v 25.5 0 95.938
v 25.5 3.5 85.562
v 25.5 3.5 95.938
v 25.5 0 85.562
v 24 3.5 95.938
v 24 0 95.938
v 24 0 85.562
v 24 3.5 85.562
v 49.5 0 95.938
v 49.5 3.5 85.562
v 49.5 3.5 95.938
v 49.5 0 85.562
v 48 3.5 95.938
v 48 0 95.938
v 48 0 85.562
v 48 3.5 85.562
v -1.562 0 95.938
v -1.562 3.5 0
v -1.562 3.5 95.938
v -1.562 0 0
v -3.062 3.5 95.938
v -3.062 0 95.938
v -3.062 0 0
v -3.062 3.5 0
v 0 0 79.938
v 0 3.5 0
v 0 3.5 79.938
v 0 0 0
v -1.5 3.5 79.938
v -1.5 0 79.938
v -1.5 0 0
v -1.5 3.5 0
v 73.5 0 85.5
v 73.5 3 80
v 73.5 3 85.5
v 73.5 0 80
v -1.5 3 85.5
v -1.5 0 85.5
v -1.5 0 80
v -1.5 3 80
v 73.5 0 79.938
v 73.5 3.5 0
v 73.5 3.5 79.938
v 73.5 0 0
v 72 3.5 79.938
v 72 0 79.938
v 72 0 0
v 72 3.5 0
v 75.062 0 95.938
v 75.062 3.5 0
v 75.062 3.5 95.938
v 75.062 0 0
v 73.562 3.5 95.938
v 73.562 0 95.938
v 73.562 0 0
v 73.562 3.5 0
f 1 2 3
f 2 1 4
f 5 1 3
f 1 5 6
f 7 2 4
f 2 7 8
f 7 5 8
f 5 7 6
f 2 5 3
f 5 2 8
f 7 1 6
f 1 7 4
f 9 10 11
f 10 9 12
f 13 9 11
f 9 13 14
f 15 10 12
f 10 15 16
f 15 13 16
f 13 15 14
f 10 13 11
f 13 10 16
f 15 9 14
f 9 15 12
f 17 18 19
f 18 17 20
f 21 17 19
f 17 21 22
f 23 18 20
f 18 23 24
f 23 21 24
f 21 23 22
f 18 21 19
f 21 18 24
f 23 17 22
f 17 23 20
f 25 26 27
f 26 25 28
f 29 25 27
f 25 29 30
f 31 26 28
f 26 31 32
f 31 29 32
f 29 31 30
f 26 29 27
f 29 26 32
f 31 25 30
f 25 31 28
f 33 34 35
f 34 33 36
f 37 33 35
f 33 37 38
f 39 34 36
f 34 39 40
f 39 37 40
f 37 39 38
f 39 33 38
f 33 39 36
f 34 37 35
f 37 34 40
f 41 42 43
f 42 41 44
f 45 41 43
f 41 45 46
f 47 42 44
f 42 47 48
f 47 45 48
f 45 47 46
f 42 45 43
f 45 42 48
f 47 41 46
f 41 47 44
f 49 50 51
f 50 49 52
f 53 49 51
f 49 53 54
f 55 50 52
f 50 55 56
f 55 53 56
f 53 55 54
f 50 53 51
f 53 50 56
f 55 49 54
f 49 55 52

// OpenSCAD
// Door opening dimension (W x H x D)
Door_Dimensions = [72, 80, 3.5];

// Dimensions of the studs material to use (W x H x L)
Stud_Dimensions = [1.5, 3.5, 96];

// Dimensions of the header material.
Header_Dimensions = [1.5, 5.5, 96];

// Cripple stud spacing.
Cripple_Stud_Spacing = 24;

// Object spacing to avoid merging on export.
Object_Spacing = 0.0625;

module door(door_dimensions, stud_dimensions = [1.5, 3.5, 96], header_dimensions = [1.5, 5.5, 96], cripple_stud_spacing = 24, object_spacing = 0.0625) {
    // left king stub
    translate([-(stud_dimensions[0] * 2) - object_spacing, 0, 0])
    cube([stud_dimensions[0], stud_dimensions[1], stud_dimensions[2] - object_spacing]);

    // left jack stud
    translate([-stud_dimensions[0], 0, 0])
    cube([stud_dimensions[0], stud_dimensions[1], door_dimensions[1] - object_spacing]);

    // header layer 1
    translate([-stud_dimensions[0], 0, door_dimensions[1]])
    cube([door_dimensions[0] + (stud_dimensions[0] * 2), header_dimensions[0], header_dimensions[1]]);

    // header layer 2
    translate([-stud_dimensions[0], header_dimensions[0], door_dimensions[1]])
    cube([door_dimensions[0] + (stud_dimensions[0] * 2), header_dimensions[0], header_dimensions[1]]);

    // right jack stud
    translate([door_dimensions[0], 0, 0])
    cube([stud_dimensions[0], stud_dimensions[1], door_dimensions[1] - object_spacing]);

    // right king stud
    translate([door_dimensions[0] + stud_dimensions[0] + object_spacing, 0, 0])
    cube([stud_dimensions[0], stud_dimensions[1], stud_dimensions[2] - object_spacing]);

    // cripple studs above header
    for(i = [cripple_stud_spacing:cripple_stud_spacing:door_dimensions[0] - cripple_stud_spacing]) {
        translate([i, 0, door_dimensions[1] + header_dimensions[1] + object_spacing])
        cube([stud_dimensions[0], stud_dimensions[1], stud_dimensions[2] - door_dimensions[1] - header_dimensions[1] - (object_spacing * 2)]);
    }

   // cube([door_dimensions[0], door_dimensions[2], door_dimensions[1]]);
}

door(Door_Dimensions, Stud_Dimensions, Header_Dimensions, Cripple_Stud_Spacing, Object_Spacing);
